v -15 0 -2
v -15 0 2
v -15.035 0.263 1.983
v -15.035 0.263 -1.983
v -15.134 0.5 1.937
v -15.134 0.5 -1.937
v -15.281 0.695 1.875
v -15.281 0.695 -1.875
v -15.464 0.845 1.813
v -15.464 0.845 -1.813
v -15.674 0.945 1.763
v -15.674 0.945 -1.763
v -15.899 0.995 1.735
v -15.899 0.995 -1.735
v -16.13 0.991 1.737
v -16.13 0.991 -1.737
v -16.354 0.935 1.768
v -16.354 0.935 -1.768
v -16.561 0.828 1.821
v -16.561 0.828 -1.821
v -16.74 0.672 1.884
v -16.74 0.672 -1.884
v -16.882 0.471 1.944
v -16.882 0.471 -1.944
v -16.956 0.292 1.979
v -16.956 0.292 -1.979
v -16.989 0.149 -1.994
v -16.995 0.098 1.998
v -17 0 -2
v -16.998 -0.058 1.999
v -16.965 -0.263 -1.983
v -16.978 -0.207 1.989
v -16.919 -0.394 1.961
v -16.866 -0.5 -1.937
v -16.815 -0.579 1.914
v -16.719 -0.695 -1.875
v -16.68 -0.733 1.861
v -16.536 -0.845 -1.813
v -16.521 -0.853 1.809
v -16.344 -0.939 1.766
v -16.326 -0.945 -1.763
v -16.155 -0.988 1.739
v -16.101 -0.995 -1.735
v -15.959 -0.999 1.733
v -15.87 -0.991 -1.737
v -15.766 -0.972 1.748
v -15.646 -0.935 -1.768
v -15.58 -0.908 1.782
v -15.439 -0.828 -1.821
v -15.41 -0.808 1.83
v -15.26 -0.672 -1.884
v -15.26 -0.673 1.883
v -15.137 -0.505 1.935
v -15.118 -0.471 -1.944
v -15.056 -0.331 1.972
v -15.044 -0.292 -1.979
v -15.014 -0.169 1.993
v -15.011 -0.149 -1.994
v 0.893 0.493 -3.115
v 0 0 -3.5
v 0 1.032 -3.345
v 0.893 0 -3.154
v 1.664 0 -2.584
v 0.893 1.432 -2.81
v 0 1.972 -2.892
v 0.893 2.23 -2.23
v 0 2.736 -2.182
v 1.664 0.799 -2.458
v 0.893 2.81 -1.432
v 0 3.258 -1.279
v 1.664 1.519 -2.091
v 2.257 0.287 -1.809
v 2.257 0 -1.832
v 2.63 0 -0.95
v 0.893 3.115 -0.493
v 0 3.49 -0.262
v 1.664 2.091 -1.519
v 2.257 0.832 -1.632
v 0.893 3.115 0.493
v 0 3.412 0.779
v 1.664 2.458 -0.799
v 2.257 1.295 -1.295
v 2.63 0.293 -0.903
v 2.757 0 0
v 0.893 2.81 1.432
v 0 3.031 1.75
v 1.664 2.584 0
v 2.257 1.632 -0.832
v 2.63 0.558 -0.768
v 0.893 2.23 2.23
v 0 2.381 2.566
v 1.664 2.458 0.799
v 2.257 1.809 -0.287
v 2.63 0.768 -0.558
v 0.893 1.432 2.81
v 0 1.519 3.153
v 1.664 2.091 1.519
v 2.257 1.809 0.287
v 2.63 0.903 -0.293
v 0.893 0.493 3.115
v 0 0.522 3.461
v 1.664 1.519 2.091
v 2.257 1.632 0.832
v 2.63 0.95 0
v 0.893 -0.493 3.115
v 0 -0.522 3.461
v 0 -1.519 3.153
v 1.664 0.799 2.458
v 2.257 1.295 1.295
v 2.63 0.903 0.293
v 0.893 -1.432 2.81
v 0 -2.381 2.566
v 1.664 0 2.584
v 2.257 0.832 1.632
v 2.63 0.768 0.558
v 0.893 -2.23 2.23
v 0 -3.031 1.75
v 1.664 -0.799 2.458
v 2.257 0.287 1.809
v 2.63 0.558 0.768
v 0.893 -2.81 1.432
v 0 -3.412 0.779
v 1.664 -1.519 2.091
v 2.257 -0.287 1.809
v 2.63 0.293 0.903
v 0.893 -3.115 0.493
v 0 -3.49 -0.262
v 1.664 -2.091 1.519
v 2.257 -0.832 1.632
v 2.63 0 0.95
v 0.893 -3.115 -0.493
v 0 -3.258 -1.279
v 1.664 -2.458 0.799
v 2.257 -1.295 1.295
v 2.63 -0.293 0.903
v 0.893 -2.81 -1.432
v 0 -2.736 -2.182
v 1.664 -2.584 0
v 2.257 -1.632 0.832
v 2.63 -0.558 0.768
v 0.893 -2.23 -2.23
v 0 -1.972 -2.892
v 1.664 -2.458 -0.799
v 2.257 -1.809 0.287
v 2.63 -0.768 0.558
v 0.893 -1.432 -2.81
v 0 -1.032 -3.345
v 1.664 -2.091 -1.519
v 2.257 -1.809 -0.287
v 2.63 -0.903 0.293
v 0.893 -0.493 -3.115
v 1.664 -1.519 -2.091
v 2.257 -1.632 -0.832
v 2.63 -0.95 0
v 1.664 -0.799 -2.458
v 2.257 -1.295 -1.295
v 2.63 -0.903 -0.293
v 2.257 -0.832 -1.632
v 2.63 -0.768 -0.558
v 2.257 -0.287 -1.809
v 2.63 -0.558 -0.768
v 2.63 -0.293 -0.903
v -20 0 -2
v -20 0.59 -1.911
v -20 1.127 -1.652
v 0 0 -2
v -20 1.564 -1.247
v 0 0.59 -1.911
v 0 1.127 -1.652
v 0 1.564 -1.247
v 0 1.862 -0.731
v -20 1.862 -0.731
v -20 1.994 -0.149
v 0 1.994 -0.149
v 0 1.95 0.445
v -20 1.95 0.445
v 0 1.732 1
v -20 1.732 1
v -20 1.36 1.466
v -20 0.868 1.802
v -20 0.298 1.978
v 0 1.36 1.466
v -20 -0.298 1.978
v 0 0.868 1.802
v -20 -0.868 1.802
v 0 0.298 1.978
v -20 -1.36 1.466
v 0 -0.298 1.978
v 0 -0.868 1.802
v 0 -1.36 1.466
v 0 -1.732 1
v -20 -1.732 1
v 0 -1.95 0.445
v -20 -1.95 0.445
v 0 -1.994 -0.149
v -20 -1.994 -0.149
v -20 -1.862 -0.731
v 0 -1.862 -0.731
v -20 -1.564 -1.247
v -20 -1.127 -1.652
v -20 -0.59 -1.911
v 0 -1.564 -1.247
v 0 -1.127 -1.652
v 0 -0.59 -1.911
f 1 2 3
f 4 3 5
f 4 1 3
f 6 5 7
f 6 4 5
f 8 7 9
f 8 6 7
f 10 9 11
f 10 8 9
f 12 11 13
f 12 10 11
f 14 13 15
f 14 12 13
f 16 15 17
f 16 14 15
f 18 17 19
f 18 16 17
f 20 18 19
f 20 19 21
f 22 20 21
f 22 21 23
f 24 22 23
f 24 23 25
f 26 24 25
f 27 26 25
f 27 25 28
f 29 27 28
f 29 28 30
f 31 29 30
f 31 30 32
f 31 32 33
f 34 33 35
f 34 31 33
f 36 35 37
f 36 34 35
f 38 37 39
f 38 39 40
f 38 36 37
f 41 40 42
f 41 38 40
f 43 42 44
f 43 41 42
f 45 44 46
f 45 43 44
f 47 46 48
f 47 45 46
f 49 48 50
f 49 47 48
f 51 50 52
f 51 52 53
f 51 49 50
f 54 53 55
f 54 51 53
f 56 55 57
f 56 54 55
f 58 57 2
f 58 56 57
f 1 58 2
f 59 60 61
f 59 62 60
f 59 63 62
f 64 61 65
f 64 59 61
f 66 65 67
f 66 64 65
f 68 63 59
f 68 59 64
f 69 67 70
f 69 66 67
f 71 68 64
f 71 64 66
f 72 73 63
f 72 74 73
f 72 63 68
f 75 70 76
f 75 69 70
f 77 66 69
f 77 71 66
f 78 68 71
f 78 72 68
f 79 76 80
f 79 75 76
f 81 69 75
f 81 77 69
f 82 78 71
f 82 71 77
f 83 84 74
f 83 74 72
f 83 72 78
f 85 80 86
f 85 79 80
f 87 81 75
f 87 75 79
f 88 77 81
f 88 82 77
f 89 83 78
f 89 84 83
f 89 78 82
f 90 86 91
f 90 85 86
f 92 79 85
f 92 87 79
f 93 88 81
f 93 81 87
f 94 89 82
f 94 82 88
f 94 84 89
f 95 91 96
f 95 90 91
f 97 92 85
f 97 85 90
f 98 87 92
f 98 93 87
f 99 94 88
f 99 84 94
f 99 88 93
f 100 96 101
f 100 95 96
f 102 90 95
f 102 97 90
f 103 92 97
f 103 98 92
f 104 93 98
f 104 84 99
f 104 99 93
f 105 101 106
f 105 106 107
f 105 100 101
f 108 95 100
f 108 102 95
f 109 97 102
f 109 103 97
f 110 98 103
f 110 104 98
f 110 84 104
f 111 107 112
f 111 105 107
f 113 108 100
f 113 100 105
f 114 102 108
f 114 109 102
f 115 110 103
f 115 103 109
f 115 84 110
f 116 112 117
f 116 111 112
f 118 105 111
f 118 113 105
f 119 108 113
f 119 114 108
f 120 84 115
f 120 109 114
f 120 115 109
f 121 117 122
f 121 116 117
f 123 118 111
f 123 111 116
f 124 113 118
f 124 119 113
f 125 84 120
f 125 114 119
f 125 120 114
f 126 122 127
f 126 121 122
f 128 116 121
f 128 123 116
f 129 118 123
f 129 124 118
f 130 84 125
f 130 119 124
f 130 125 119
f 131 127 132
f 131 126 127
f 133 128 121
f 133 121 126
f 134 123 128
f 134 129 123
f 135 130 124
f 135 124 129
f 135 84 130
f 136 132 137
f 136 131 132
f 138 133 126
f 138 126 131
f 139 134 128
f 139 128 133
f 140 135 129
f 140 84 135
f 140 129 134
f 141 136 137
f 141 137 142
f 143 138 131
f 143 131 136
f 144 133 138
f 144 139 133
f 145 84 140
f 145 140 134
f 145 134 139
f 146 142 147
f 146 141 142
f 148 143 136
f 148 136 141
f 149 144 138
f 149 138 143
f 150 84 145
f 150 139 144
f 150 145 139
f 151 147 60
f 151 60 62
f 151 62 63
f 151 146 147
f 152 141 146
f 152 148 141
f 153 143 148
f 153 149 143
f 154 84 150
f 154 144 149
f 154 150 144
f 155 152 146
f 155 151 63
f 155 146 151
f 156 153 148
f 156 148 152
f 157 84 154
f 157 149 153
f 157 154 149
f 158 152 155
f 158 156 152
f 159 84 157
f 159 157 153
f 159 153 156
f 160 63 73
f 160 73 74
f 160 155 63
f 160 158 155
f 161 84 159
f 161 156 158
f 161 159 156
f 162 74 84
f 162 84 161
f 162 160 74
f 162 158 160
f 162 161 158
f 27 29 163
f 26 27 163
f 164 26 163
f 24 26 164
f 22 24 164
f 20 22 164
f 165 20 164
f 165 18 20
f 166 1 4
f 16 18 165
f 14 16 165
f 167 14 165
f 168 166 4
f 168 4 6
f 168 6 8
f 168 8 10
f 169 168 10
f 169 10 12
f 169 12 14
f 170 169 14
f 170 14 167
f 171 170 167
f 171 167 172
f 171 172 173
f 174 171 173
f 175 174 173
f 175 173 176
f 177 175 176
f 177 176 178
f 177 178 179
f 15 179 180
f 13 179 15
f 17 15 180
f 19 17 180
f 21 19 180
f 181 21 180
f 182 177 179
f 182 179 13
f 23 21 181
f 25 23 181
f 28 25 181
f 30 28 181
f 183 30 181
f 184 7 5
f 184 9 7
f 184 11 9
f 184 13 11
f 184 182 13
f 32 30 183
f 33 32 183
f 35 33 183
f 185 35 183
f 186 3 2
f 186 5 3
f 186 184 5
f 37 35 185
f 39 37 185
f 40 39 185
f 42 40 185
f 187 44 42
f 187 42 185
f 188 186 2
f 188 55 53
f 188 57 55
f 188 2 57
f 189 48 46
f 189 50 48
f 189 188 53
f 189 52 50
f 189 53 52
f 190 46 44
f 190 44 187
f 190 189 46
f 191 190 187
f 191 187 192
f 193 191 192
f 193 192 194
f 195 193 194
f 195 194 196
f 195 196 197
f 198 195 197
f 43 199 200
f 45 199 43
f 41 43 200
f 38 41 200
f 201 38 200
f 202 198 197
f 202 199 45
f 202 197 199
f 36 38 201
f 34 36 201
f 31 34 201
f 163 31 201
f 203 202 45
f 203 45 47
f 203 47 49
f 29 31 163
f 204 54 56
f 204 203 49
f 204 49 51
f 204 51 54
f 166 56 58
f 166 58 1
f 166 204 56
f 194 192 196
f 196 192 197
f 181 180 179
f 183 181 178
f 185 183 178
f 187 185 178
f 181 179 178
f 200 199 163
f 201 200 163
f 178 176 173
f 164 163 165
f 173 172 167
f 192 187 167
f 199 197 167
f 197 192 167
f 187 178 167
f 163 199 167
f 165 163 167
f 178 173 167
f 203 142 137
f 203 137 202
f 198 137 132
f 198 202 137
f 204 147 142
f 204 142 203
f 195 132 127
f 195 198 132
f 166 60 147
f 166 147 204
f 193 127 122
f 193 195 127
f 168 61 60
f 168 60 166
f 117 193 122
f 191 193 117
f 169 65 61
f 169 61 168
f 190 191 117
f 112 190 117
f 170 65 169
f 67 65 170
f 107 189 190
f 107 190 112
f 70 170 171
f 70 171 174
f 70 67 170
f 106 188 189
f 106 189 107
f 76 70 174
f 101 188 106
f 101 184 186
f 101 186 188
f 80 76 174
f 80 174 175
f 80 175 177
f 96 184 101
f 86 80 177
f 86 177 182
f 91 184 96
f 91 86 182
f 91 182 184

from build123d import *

# Parameters (mm, degrees)
SKETCH1_R               = 2
BOSS_EXTRUDE1_DEPTH     = 20
CUT_EXTRUDE1_DEPTH      = 21.199009877
CUT_EXTRUDE1_DEPTH_BACK = 21.199009877
SKETCH2_R               = 1


with BuildPart() as part:
    # Sketch1 → Boss-Extrude1 (new body)
    with BuildSketch(Plane(origin=(0, 0, 0), x_dir=(0, 0, -1), z_dir=(1, 0, 0))):
        Circle(SKETCH1_R)
    extrude(amount=-BOSS_EXTRUDE1_DEPTH)

    # Sketch2 → Cut-Extrude1 (cut, two sides: drawn at the far end of the back side and taken through both)
    with BuildSketch(Plane.XY.offset(-CUT_EXTRUDE1_DEPTH_BACK)):
        with Locations((-16, 0)):
            Circle(SKETCH2_R)
    extrude(amount=CUT_EXTRUDE1_DEPTH + CUT_EXTRUDE1_DEPTH_BACK, mode=Mode.SUBTRACT)

    # Sketch3 → Revolve1 (revolve)
    with BuildSketch(Plane(origin=(0, 0, 0), x_dir=(1, 0, 0), z_dir=(0, 1, 0))):
        with BuildLine():
            Line((2.757385023, 0), (0, 0))
            Line((0, 0), (0, 3.5))
            ThreePointArc((0, 3.5), (1.985229955, 2.227844932), (2.757385023, 0))
        make_face()
    revolve(axis=Axis((-7.558889504, 0, 0), (1, 0, 0)))


solid = part.part
